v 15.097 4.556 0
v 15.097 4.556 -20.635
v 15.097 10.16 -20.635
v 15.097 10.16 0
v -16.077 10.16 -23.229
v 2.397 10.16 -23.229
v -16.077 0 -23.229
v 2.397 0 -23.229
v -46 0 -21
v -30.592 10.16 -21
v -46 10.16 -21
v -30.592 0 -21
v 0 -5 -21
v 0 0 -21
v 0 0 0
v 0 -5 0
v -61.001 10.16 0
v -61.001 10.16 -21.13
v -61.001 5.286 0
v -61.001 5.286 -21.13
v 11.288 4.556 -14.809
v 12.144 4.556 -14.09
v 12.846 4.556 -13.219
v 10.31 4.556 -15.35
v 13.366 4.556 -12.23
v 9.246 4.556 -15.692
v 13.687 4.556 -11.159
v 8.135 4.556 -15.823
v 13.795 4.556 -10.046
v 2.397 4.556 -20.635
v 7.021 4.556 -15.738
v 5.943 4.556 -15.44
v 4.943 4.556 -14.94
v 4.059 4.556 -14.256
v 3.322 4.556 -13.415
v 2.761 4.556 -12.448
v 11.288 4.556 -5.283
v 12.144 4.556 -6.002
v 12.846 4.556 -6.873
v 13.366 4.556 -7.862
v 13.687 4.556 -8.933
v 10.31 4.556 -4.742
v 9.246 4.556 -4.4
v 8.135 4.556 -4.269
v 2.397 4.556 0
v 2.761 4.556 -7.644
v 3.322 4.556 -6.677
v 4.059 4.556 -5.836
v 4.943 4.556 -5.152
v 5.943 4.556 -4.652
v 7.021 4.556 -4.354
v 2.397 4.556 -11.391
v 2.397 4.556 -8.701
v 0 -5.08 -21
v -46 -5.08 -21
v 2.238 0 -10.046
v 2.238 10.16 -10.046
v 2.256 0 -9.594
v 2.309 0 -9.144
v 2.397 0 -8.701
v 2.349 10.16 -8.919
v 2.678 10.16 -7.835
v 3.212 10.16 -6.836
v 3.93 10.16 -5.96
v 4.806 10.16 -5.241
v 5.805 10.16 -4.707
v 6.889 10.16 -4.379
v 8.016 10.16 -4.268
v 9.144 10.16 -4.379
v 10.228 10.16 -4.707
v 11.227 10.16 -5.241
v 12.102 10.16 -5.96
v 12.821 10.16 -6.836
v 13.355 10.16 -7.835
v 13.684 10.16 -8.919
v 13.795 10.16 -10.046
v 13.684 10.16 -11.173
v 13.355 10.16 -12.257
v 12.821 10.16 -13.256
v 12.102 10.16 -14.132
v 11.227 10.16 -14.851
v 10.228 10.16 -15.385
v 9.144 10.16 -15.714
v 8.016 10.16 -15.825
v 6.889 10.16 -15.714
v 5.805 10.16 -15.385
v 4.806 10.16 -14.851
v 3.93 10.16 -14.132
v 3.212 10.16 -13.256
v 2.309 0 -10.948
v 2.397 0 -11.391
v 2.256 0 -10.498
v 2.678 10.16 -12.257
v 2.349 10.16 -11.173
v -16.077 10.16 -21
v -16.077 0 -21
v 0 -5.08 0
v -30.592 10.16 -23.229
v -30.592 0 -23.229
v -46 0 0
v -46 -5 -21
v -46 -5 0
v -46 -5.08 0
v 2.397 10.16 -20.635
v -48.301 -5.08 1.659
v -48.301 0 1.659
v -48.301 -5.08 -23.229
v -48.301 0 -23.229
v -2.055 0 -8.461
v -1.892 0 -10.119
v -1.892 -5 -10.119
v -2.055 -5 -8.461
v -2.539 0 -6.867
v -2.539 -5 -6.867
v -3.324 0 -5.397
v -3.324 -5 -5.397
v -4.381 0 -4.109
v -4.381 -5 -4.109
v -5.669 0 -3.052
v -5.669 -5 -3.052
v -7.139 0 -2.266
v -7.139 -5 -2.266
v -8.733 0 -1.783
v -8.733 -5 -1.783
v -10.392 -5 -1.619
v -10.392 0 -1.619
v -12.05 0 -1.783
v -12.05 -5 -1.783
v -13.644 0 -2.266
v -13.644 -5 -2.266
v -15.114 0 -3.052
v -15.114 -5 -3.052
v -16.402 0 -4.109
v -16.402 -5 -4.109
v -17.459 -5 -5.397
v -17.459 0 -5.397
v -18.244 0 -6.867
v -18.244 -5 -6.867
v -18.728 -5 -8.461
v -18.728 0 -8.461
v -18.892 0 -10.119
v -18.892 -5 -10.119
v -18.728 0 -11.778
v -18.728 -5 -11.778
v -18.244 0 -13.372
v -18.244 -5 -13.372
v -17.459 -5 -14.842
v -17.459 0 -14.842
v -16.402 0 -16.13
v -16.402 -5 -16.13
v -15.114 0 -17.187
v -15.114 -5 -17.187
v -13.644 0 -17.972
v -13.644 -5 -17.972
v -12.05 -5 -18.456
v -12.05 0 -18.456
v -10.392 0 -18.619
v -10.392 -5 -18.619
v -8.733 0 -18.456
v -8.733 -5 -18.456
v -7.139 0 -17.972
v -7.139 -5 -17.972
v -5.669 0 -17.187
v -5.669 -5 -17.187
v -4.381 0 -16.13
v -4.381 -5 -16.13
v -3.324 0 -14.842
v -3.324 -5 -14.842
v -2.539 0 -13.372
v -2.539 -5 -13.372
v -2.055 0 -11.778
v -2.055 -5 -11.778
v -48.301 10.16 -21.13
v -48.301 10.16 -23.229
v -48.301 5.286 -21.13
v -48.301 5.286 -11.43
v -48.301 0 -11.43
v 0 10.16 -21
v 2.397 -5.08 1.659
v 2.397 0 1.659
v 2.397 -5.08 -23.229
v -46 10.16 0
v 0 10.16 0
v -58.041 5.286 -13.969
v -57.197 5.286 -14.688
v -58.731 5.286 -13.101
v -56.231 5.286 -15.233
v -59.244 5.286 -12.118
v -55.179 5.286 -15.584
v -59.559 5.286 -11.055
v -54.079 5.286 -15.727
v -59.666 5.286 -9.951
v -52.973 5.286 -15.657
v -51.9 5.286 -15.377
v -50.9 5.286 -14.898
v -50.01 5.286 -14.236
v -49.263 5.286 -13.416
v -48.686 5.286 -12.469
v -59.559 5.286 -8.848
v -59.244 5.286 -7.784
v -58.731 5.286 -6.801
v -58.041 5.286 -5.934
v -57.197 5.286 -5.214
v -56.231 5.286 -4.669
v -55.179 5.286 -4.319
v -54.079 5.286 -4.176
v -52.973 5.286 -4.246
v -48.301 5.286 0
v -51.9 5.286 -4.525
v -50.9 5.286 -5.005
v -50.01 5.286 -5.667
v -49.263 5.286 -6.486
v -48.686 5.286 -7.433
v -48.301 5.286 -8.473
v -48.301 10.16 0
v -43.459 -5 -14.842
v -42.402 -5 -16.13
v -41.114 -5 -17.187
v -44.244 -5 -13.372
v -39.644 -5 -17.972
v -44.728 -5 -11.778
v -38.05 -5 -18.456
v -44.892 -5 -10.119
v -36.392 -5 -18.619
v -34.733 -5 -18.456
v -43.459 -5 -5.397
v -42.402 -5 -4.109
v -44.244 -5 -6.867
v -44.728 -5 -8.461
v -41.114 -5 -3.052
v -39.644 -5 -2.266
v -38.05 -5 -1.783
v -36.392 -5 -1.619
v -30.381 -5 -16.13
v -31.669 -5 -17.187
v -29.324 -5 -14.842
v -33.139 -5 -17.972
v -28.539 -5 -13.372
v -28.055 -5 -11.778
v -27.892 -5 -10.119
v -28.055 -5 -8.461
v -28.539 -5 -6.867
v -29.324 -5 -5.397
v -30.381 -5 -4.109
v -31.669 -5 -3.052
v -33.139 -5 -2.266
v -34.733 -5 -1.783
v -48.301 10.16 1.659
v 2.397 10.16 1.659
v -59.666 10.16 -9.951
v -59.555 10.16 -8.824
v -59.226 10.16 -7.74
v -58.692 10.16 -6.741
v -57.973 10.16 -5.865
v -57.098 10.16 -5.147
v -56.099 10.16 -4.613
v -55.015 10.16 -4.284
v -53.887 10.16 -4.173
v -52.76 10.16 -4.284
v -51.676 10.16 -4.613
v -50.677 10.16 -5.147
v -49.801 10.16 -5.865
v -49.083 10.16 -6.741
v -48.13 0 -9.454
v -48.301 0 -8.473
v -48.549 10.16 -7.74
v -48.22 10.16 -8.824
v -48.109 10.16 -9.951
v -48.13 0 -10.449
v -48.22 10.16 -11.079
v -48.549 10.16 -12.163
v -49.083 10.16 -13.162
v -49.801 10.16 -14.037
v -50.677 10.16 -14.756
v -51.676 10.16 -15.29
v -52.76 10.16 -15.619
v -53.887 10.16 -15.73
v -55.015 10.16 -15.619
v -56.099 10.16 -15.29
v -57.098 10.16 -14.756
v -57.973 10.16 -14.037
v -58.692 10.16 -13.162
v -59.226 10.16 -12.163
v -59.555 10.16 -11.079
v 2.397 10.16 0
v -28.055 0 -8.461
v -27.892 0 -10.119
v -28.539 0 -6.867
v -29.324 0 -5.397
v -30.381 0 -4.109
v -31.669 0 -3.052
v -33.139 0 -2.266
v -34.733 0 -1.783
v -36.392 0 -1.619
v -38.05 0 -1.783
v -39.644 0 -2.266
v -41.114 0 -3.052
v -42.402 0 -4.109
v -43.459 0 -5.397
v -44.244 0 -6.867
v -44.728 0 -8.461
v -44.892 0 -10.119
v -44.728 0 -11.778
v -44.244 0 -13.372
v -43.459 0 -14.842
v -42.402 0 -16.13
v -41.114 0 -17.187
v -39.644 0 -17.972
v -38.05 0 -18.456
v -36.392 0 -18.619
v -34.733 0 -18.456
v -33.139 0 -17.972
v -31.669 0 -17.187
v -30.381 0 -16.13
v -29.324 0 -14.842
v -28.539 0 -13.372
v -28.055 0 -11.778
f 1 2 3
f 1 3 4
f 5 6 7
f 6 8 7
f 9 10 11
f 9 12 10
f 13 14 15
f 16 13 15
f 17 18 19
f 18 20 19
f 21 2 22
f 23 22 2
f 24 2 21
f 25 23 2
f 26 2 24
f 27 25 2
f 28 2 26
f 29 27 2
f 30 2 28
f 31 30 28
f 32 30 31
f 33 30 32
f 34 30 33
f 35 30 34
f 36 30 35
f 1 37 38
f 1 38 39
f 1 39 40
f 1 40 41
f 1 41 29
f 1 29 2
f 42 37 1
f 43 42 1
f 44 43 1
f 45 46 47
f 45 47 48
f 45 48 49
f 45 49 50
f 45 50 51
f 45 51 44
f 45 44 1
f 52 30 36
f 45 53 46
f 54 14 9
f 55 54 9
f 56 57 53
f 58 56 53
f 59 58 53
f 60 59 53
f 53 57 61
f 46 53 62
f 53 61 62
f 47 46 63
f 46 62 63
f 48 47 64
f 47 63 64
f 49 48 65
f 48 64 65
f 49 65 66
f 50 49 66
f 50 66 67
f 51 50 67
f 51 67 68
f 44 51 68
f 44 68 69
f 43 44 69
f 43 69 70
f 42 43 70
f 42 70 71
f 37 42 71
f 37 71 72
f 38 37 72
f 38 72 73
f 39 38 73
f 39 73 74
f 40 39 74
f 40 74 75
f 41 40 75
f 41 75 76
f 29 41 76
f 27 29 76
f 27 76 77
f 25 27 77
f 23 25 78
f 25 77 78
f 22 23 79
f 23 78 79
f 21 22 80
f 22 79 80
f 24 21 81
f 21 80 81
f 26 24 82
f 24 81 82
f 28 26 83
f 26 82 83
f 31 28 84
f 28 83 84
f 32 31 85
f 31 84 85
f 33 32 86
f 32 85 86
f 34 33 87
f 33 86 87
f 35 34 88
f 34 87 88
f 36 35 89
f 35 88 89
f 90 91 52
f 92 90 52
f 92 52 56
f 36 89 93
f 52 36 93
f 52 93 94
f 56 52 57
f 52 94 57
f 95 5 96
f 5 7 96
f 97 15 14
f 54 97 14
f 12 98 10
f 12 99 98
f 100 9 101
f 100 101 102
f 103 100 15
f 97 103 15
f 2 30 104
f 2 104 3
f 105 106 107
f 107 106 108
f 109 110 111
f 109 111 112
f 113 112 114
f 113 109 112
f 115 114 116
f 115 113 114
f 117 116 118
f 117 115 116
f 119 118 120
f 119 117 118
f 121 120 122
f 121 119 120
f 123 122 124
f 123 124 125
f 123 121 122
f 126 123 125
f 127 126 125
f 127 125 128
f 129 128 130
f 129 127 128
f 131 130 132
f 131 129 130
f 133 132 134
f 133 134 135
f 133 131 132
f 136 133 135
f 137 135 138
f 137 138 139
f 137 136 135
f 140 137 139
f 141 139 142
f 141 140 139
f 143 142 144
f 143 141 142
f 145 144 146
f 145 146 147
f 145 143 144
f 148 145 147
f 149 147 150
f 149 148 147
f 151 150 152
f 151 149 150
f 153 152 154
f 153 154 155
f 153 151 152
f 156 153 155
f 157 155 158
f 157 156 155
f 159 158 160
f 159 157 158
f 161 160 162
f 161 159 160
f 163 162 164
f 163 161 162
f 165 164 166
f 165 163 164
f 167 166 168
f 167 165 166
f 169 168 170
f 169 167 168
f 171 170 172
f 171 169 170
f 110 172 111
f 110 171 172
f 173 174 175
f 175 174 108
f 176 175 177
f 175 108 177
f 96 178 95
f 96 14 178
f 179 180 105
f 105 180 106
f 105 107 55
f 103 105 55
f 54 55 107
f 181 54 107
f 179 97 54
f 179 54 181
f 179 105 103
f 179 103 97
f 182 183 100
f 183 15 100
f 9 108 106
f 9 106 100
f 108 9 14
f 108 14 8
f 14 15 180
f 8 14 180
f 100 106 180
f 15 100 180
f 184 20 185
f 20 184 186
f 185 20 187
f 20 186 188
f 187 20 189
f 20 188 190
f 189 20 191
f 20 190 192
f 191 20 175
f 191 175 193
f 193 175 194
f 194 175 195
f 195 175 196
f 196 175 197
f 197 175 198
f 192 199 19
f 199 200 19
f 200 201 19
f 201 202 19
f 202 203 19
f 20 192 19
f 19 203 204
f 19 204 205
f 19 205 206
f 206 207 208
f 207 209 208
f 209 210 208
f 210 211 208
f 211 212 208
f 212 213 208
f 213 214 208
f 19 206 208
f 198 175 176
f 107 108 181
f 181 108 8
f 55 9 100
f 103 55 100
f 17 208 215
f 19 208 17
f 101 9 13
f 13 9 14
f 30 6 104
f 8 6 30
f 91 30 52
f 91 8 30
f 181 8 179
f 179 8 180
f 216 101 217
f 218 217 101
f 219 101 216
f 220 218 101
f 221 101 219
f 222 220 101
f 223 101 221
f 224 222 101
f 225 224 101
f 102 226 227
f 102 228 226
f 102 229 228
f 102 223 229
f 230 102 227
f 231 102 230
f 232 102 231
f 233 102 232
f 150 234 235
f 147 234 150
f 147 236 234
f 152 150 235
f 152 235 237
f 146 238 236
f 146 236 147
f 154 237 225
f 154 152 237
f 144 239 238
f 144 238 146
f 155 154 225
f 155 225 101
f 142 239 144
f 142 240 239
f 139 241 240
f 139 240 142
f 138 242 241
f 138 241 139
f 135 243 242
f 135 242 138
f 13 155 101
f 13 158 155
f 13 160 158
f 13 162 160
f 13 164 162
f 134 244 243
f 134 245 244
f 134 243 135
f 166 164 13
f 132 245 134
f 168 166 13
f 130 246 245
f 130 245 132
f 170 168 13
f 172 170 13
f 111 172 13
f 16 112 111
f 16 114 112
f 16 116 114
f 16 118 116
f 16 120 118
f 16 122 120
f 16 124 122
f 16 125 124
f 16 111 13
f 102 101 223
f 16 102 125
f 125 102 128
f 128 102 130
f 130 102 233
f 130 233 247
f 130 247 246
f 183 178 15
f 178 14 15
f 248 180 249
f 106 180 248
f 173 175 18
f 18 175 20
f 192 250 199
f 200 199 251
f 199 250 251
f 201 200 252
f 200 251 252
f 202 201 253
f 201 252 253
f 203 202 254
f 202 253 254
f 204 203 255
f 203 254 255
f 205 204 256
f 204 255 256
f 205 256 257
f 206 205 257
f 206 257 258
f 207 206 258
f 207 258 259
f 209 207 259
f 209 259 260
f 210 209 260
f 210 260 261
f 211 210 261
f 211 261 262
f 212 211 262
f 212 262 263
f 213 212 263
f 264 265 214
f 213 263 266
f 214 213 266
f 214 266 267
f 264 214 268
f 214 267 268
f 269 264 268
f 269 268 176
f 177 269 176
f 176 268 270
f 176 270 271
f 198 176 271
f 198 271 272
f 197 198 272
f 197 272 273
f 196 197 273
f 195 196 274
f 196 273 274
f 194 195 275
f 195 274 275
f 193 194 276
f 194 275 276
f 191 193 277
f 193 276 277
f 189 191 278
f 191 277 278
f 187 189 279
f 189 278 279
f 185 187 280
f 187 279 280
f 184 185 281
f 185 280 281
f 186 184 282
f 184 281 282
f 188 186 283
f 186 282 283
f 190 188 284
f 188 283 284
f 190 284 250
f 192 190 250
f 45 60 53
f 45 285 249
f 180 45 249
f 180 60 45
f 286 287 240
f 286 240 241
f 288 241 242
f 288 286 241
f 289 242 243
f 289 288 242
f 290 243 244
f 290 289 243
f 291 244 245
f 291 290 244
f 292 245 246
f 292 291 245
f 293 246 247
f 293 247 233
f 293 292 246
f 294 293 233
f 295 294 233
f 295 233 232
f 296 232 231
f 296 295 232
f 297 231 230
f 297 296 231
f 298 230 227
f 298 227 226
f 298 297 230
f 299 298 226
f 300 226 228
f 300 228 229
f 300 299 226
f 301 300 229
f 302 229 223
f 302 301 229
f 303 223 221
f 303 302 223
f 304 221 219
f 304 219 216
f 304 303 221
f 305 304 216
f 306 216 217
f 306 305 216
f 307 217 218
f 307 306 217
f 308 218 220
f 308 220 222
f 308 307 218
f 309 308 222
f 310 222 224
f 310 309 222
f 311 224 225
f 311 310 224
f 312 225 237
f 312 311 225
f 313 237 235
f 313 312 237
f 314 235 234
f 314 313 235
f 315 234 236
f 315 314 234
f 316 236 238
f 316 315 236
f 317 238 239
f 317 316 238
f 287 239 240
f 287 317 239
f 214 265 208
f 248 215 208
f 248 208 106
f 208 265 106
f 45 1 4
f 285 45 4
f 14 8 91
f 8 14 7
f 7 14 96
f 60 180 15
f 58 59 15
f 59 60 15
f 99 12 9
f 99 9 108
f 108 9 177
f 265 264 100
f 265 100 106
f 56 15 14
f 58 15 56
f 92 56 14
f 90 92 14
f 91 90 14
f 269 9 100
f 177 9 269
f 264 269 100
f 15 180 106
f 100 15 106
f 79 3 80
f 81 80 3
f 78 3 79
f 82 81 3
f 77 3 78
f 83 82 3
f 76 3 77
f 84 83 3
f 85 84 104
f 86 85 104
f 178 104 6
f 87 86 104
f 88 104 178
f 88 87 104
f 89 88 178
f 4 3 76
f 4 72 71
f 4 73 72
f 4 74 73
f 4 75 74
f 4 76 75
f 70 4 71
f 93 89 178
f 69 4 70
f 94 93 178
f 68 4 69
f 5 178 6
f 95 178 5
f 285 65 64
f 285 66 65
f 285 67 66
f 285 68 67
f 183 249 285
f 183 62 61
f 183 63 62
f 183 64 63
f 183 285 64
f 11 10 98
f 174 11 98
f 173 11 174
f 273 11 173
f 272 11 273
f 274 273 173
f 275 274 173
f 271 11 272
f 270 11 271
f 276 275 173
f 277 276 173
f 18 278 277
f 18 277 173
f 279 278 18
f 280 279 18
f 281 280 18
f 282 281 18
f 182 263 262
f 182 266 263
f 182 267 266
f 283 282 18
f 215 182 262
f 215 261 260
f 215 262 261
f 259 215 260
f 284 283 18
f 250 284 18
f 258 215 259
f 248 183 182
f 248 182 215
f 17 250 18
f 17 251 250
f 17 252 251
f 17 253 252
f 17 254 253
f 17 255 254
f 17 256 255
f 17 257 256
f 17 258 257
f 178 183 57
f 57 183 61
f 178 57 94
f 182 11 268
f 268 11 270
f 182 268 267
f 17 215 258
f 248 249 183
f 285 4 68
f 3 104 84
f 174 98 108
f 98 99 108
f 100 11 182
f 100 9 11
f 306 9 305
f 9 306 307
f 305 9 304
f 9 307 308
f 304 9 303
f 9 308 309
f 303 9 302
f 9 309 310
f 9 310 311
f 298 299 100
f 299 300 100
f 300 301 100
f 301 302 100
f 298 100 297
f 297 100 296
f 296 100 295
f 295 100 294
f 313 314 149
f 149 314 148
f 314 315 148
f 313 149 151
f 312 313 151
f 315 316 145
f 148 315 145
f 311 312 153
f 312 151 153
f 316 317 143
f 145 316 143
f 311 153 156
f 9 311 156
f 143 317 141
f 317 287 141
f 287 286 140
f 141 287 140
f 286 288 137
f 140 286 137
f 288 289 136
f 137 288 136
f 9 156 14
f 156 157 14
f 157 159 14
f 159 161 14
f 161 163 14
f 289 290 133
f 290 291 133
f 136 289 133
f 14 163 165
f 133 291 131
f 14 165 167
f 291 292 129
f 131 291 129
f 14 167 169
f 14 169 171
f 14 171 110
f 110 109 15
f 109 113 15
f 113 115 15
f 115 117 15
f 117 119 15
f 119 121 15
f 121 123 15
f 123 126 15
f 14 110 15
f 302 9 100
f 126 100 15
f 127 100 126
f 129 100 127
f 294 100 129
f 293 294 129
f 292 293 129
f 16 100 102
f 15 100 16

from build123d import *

# Parameters (mm, degrees)
F0_W      = 46
F0_H      = 21
F0_R      = 8.5
F1_DEPTH  = 5
F2_W      = 50.6975790486
F2_H      = 24.8879023129
F2_W_2    = 46
F2_H_2    = 21
F3_DEPTH  = 25.4
F4_W      = 14.5150721073
F4_H      = 25.4
F5_DEPTH  = 14.732
F6_W      = 50.6975790486
F6_H      = 24.8879023129
F7_DEPTH  = 10.16
F8_W      = 14.5150721073
F8_H      = 2.2287086546
F9_DEPTH  = 5.08
F10_DEPTH = 7.874
F12_W     = 2.0801138837
F12_H     = 21.1301185191
F14_DEPTH = 12.7
F13_W     = 2.8098069835
F13_H     = 20.6354465336
F15_DEPTH = 12.7
F16_DEPTH = 2.794
F17_R     = 5.7785
F18_DEPTH = 25.4


# Not quite as in the source:
# - a feature of the source that left no trace in its solid (it failed there, or was rolled back) is left out


with BuildPart() as f1:
    # F0 (on Front) → F1 (new body)
    with BuildSketch(Plane.XZ):
        with Locations((-23, -10.5)):
            Rectangle(F0_W, F0_H)
        with Locations((-36.3915145417, -10.1194066999)):
            Circle(F0_R, mode=Mode.SUBTRACT)
        with Locations((-10.3915145417, -10.1194066999)):
            Circle(F0_R, mode=Mode.SUBTRACT)
    extrude(amount=F1_DEPTH)


with BuildPart() as f3:
    # F2 (on face) → F3 (new body)
    with BuildSketch(Plane(origin=(0, 0, 0), x_dir=(-1, 0, 0), z_dir=(0, 1, 0))):
        with Locations((22.9521770962, -10.7847574982)):
            Rectangle(F2_W, F2_H)
        with Locations((23, -10.5)):
            Rectangle(F2_W_2, F2_H_2, mode=Mode.SUBTRACT)
    extrude(amount=F3_DEPTH)

    # F4 (on face) → F5 (cut)
    with BuildSketch(Plane.XY.offset(-21)):
        with Locations((-23.3345888555, 12.7)):
            Rectangle(F4_W, F4_H)
    extrude(amount=-F5_DEPTH, mode=Mode.SUBTRACT)

    # F6 (on face) → F7 (cut)
    with BuildSketch(Plane(origin=(0, 25.4, 0), x_dir=(-1, 0, 0), z_dir=(0, 1, 0))):
        with Locations((22.9521770962, -10.7847574982)):
            Rectangle(F6_W, F6_H)
    extrude(amount=-F7_DEPTH, mode=Mode.SUBTRACT)

    # F10 (cut): a face of the model
    f10_faces = [f3.faces().sort_by_distance(p)[0] for p in [
        (-47.7361965608, 15.24, -10.7847574982),
    ]]
    extrude(f10_faces, amount=-F10_DEPTH, mode=Mode.SUBTRACT)

    # F12 (on face) → F14 (join)
    with BuildSketch(Plane(origin=(-48.3009666204, 0, 0), x_dir=(0, -1, 0), z_dir=(-1, 0, 0))):
        with Locations((-6.3259430582, -10.5650592595)):
            Rectangle(F12_W, F12_H)
    extrude(amount=F14_DEPTH)

    # F13 (on face) → F15 (join)
    with BuildSketch(Plane.YZ.offset(2.3966124281)):
        with Locations((5.9610965082, -10.3177232668)):
            Rectangle(F13_W, F13_H)
    extrude(amount=F15_DEPTH)

    # F16 (add): a face of the model
    f16_faces = [f3.faces().sort_by_distance(p)[0] for p in [
        (-47.5003263005, 7.366, -22.1794135869),
    ]]
    extrude(f16_faces, amount=F16_DEPTH)

    # F17 (on face) → F18 (cut)
    with BuildSketch(Plane(origin=(0, 10.16, 0), x_dir=(-1, 0, 0), z_dir=(0, 1, 0))):
        with Locations((-8.016298525, -10.0460601971)):
            Circle(F17_R)
        with Locations((53.8871772587, -9.9512618035)):
            Circle(F17_R)
    extrude(amount=-F18_DEPTH, mode=Mode.SUBTRACT)


with BuildPart() as f9:
    # F8 (on face) → F9 (new body)
    with BuildSketch(Plane.XZ):
        Polygon((-48.3009666204, 1.6591936583), (-48.3009666204, -23.2287086546), (-30.5921249092, -23.2287086546), (-30.5921249092, -21), (-46, -21), (-46, 0), (0, 0), (0, -21), (-16.0770528018, -21), (-16.0770528018, -23.2287086546), (2.3966124281, -23.2287086546), (2.3966124281, 1.6591936583), align=None)
        with Locations((-23.3345888555, -22.1143543273)):
            Rectangle(F8_W, F8_H)
    extrude(amount=F9_DEPTH)


solid = Compound([f1.part, f3.part, f9.part])
